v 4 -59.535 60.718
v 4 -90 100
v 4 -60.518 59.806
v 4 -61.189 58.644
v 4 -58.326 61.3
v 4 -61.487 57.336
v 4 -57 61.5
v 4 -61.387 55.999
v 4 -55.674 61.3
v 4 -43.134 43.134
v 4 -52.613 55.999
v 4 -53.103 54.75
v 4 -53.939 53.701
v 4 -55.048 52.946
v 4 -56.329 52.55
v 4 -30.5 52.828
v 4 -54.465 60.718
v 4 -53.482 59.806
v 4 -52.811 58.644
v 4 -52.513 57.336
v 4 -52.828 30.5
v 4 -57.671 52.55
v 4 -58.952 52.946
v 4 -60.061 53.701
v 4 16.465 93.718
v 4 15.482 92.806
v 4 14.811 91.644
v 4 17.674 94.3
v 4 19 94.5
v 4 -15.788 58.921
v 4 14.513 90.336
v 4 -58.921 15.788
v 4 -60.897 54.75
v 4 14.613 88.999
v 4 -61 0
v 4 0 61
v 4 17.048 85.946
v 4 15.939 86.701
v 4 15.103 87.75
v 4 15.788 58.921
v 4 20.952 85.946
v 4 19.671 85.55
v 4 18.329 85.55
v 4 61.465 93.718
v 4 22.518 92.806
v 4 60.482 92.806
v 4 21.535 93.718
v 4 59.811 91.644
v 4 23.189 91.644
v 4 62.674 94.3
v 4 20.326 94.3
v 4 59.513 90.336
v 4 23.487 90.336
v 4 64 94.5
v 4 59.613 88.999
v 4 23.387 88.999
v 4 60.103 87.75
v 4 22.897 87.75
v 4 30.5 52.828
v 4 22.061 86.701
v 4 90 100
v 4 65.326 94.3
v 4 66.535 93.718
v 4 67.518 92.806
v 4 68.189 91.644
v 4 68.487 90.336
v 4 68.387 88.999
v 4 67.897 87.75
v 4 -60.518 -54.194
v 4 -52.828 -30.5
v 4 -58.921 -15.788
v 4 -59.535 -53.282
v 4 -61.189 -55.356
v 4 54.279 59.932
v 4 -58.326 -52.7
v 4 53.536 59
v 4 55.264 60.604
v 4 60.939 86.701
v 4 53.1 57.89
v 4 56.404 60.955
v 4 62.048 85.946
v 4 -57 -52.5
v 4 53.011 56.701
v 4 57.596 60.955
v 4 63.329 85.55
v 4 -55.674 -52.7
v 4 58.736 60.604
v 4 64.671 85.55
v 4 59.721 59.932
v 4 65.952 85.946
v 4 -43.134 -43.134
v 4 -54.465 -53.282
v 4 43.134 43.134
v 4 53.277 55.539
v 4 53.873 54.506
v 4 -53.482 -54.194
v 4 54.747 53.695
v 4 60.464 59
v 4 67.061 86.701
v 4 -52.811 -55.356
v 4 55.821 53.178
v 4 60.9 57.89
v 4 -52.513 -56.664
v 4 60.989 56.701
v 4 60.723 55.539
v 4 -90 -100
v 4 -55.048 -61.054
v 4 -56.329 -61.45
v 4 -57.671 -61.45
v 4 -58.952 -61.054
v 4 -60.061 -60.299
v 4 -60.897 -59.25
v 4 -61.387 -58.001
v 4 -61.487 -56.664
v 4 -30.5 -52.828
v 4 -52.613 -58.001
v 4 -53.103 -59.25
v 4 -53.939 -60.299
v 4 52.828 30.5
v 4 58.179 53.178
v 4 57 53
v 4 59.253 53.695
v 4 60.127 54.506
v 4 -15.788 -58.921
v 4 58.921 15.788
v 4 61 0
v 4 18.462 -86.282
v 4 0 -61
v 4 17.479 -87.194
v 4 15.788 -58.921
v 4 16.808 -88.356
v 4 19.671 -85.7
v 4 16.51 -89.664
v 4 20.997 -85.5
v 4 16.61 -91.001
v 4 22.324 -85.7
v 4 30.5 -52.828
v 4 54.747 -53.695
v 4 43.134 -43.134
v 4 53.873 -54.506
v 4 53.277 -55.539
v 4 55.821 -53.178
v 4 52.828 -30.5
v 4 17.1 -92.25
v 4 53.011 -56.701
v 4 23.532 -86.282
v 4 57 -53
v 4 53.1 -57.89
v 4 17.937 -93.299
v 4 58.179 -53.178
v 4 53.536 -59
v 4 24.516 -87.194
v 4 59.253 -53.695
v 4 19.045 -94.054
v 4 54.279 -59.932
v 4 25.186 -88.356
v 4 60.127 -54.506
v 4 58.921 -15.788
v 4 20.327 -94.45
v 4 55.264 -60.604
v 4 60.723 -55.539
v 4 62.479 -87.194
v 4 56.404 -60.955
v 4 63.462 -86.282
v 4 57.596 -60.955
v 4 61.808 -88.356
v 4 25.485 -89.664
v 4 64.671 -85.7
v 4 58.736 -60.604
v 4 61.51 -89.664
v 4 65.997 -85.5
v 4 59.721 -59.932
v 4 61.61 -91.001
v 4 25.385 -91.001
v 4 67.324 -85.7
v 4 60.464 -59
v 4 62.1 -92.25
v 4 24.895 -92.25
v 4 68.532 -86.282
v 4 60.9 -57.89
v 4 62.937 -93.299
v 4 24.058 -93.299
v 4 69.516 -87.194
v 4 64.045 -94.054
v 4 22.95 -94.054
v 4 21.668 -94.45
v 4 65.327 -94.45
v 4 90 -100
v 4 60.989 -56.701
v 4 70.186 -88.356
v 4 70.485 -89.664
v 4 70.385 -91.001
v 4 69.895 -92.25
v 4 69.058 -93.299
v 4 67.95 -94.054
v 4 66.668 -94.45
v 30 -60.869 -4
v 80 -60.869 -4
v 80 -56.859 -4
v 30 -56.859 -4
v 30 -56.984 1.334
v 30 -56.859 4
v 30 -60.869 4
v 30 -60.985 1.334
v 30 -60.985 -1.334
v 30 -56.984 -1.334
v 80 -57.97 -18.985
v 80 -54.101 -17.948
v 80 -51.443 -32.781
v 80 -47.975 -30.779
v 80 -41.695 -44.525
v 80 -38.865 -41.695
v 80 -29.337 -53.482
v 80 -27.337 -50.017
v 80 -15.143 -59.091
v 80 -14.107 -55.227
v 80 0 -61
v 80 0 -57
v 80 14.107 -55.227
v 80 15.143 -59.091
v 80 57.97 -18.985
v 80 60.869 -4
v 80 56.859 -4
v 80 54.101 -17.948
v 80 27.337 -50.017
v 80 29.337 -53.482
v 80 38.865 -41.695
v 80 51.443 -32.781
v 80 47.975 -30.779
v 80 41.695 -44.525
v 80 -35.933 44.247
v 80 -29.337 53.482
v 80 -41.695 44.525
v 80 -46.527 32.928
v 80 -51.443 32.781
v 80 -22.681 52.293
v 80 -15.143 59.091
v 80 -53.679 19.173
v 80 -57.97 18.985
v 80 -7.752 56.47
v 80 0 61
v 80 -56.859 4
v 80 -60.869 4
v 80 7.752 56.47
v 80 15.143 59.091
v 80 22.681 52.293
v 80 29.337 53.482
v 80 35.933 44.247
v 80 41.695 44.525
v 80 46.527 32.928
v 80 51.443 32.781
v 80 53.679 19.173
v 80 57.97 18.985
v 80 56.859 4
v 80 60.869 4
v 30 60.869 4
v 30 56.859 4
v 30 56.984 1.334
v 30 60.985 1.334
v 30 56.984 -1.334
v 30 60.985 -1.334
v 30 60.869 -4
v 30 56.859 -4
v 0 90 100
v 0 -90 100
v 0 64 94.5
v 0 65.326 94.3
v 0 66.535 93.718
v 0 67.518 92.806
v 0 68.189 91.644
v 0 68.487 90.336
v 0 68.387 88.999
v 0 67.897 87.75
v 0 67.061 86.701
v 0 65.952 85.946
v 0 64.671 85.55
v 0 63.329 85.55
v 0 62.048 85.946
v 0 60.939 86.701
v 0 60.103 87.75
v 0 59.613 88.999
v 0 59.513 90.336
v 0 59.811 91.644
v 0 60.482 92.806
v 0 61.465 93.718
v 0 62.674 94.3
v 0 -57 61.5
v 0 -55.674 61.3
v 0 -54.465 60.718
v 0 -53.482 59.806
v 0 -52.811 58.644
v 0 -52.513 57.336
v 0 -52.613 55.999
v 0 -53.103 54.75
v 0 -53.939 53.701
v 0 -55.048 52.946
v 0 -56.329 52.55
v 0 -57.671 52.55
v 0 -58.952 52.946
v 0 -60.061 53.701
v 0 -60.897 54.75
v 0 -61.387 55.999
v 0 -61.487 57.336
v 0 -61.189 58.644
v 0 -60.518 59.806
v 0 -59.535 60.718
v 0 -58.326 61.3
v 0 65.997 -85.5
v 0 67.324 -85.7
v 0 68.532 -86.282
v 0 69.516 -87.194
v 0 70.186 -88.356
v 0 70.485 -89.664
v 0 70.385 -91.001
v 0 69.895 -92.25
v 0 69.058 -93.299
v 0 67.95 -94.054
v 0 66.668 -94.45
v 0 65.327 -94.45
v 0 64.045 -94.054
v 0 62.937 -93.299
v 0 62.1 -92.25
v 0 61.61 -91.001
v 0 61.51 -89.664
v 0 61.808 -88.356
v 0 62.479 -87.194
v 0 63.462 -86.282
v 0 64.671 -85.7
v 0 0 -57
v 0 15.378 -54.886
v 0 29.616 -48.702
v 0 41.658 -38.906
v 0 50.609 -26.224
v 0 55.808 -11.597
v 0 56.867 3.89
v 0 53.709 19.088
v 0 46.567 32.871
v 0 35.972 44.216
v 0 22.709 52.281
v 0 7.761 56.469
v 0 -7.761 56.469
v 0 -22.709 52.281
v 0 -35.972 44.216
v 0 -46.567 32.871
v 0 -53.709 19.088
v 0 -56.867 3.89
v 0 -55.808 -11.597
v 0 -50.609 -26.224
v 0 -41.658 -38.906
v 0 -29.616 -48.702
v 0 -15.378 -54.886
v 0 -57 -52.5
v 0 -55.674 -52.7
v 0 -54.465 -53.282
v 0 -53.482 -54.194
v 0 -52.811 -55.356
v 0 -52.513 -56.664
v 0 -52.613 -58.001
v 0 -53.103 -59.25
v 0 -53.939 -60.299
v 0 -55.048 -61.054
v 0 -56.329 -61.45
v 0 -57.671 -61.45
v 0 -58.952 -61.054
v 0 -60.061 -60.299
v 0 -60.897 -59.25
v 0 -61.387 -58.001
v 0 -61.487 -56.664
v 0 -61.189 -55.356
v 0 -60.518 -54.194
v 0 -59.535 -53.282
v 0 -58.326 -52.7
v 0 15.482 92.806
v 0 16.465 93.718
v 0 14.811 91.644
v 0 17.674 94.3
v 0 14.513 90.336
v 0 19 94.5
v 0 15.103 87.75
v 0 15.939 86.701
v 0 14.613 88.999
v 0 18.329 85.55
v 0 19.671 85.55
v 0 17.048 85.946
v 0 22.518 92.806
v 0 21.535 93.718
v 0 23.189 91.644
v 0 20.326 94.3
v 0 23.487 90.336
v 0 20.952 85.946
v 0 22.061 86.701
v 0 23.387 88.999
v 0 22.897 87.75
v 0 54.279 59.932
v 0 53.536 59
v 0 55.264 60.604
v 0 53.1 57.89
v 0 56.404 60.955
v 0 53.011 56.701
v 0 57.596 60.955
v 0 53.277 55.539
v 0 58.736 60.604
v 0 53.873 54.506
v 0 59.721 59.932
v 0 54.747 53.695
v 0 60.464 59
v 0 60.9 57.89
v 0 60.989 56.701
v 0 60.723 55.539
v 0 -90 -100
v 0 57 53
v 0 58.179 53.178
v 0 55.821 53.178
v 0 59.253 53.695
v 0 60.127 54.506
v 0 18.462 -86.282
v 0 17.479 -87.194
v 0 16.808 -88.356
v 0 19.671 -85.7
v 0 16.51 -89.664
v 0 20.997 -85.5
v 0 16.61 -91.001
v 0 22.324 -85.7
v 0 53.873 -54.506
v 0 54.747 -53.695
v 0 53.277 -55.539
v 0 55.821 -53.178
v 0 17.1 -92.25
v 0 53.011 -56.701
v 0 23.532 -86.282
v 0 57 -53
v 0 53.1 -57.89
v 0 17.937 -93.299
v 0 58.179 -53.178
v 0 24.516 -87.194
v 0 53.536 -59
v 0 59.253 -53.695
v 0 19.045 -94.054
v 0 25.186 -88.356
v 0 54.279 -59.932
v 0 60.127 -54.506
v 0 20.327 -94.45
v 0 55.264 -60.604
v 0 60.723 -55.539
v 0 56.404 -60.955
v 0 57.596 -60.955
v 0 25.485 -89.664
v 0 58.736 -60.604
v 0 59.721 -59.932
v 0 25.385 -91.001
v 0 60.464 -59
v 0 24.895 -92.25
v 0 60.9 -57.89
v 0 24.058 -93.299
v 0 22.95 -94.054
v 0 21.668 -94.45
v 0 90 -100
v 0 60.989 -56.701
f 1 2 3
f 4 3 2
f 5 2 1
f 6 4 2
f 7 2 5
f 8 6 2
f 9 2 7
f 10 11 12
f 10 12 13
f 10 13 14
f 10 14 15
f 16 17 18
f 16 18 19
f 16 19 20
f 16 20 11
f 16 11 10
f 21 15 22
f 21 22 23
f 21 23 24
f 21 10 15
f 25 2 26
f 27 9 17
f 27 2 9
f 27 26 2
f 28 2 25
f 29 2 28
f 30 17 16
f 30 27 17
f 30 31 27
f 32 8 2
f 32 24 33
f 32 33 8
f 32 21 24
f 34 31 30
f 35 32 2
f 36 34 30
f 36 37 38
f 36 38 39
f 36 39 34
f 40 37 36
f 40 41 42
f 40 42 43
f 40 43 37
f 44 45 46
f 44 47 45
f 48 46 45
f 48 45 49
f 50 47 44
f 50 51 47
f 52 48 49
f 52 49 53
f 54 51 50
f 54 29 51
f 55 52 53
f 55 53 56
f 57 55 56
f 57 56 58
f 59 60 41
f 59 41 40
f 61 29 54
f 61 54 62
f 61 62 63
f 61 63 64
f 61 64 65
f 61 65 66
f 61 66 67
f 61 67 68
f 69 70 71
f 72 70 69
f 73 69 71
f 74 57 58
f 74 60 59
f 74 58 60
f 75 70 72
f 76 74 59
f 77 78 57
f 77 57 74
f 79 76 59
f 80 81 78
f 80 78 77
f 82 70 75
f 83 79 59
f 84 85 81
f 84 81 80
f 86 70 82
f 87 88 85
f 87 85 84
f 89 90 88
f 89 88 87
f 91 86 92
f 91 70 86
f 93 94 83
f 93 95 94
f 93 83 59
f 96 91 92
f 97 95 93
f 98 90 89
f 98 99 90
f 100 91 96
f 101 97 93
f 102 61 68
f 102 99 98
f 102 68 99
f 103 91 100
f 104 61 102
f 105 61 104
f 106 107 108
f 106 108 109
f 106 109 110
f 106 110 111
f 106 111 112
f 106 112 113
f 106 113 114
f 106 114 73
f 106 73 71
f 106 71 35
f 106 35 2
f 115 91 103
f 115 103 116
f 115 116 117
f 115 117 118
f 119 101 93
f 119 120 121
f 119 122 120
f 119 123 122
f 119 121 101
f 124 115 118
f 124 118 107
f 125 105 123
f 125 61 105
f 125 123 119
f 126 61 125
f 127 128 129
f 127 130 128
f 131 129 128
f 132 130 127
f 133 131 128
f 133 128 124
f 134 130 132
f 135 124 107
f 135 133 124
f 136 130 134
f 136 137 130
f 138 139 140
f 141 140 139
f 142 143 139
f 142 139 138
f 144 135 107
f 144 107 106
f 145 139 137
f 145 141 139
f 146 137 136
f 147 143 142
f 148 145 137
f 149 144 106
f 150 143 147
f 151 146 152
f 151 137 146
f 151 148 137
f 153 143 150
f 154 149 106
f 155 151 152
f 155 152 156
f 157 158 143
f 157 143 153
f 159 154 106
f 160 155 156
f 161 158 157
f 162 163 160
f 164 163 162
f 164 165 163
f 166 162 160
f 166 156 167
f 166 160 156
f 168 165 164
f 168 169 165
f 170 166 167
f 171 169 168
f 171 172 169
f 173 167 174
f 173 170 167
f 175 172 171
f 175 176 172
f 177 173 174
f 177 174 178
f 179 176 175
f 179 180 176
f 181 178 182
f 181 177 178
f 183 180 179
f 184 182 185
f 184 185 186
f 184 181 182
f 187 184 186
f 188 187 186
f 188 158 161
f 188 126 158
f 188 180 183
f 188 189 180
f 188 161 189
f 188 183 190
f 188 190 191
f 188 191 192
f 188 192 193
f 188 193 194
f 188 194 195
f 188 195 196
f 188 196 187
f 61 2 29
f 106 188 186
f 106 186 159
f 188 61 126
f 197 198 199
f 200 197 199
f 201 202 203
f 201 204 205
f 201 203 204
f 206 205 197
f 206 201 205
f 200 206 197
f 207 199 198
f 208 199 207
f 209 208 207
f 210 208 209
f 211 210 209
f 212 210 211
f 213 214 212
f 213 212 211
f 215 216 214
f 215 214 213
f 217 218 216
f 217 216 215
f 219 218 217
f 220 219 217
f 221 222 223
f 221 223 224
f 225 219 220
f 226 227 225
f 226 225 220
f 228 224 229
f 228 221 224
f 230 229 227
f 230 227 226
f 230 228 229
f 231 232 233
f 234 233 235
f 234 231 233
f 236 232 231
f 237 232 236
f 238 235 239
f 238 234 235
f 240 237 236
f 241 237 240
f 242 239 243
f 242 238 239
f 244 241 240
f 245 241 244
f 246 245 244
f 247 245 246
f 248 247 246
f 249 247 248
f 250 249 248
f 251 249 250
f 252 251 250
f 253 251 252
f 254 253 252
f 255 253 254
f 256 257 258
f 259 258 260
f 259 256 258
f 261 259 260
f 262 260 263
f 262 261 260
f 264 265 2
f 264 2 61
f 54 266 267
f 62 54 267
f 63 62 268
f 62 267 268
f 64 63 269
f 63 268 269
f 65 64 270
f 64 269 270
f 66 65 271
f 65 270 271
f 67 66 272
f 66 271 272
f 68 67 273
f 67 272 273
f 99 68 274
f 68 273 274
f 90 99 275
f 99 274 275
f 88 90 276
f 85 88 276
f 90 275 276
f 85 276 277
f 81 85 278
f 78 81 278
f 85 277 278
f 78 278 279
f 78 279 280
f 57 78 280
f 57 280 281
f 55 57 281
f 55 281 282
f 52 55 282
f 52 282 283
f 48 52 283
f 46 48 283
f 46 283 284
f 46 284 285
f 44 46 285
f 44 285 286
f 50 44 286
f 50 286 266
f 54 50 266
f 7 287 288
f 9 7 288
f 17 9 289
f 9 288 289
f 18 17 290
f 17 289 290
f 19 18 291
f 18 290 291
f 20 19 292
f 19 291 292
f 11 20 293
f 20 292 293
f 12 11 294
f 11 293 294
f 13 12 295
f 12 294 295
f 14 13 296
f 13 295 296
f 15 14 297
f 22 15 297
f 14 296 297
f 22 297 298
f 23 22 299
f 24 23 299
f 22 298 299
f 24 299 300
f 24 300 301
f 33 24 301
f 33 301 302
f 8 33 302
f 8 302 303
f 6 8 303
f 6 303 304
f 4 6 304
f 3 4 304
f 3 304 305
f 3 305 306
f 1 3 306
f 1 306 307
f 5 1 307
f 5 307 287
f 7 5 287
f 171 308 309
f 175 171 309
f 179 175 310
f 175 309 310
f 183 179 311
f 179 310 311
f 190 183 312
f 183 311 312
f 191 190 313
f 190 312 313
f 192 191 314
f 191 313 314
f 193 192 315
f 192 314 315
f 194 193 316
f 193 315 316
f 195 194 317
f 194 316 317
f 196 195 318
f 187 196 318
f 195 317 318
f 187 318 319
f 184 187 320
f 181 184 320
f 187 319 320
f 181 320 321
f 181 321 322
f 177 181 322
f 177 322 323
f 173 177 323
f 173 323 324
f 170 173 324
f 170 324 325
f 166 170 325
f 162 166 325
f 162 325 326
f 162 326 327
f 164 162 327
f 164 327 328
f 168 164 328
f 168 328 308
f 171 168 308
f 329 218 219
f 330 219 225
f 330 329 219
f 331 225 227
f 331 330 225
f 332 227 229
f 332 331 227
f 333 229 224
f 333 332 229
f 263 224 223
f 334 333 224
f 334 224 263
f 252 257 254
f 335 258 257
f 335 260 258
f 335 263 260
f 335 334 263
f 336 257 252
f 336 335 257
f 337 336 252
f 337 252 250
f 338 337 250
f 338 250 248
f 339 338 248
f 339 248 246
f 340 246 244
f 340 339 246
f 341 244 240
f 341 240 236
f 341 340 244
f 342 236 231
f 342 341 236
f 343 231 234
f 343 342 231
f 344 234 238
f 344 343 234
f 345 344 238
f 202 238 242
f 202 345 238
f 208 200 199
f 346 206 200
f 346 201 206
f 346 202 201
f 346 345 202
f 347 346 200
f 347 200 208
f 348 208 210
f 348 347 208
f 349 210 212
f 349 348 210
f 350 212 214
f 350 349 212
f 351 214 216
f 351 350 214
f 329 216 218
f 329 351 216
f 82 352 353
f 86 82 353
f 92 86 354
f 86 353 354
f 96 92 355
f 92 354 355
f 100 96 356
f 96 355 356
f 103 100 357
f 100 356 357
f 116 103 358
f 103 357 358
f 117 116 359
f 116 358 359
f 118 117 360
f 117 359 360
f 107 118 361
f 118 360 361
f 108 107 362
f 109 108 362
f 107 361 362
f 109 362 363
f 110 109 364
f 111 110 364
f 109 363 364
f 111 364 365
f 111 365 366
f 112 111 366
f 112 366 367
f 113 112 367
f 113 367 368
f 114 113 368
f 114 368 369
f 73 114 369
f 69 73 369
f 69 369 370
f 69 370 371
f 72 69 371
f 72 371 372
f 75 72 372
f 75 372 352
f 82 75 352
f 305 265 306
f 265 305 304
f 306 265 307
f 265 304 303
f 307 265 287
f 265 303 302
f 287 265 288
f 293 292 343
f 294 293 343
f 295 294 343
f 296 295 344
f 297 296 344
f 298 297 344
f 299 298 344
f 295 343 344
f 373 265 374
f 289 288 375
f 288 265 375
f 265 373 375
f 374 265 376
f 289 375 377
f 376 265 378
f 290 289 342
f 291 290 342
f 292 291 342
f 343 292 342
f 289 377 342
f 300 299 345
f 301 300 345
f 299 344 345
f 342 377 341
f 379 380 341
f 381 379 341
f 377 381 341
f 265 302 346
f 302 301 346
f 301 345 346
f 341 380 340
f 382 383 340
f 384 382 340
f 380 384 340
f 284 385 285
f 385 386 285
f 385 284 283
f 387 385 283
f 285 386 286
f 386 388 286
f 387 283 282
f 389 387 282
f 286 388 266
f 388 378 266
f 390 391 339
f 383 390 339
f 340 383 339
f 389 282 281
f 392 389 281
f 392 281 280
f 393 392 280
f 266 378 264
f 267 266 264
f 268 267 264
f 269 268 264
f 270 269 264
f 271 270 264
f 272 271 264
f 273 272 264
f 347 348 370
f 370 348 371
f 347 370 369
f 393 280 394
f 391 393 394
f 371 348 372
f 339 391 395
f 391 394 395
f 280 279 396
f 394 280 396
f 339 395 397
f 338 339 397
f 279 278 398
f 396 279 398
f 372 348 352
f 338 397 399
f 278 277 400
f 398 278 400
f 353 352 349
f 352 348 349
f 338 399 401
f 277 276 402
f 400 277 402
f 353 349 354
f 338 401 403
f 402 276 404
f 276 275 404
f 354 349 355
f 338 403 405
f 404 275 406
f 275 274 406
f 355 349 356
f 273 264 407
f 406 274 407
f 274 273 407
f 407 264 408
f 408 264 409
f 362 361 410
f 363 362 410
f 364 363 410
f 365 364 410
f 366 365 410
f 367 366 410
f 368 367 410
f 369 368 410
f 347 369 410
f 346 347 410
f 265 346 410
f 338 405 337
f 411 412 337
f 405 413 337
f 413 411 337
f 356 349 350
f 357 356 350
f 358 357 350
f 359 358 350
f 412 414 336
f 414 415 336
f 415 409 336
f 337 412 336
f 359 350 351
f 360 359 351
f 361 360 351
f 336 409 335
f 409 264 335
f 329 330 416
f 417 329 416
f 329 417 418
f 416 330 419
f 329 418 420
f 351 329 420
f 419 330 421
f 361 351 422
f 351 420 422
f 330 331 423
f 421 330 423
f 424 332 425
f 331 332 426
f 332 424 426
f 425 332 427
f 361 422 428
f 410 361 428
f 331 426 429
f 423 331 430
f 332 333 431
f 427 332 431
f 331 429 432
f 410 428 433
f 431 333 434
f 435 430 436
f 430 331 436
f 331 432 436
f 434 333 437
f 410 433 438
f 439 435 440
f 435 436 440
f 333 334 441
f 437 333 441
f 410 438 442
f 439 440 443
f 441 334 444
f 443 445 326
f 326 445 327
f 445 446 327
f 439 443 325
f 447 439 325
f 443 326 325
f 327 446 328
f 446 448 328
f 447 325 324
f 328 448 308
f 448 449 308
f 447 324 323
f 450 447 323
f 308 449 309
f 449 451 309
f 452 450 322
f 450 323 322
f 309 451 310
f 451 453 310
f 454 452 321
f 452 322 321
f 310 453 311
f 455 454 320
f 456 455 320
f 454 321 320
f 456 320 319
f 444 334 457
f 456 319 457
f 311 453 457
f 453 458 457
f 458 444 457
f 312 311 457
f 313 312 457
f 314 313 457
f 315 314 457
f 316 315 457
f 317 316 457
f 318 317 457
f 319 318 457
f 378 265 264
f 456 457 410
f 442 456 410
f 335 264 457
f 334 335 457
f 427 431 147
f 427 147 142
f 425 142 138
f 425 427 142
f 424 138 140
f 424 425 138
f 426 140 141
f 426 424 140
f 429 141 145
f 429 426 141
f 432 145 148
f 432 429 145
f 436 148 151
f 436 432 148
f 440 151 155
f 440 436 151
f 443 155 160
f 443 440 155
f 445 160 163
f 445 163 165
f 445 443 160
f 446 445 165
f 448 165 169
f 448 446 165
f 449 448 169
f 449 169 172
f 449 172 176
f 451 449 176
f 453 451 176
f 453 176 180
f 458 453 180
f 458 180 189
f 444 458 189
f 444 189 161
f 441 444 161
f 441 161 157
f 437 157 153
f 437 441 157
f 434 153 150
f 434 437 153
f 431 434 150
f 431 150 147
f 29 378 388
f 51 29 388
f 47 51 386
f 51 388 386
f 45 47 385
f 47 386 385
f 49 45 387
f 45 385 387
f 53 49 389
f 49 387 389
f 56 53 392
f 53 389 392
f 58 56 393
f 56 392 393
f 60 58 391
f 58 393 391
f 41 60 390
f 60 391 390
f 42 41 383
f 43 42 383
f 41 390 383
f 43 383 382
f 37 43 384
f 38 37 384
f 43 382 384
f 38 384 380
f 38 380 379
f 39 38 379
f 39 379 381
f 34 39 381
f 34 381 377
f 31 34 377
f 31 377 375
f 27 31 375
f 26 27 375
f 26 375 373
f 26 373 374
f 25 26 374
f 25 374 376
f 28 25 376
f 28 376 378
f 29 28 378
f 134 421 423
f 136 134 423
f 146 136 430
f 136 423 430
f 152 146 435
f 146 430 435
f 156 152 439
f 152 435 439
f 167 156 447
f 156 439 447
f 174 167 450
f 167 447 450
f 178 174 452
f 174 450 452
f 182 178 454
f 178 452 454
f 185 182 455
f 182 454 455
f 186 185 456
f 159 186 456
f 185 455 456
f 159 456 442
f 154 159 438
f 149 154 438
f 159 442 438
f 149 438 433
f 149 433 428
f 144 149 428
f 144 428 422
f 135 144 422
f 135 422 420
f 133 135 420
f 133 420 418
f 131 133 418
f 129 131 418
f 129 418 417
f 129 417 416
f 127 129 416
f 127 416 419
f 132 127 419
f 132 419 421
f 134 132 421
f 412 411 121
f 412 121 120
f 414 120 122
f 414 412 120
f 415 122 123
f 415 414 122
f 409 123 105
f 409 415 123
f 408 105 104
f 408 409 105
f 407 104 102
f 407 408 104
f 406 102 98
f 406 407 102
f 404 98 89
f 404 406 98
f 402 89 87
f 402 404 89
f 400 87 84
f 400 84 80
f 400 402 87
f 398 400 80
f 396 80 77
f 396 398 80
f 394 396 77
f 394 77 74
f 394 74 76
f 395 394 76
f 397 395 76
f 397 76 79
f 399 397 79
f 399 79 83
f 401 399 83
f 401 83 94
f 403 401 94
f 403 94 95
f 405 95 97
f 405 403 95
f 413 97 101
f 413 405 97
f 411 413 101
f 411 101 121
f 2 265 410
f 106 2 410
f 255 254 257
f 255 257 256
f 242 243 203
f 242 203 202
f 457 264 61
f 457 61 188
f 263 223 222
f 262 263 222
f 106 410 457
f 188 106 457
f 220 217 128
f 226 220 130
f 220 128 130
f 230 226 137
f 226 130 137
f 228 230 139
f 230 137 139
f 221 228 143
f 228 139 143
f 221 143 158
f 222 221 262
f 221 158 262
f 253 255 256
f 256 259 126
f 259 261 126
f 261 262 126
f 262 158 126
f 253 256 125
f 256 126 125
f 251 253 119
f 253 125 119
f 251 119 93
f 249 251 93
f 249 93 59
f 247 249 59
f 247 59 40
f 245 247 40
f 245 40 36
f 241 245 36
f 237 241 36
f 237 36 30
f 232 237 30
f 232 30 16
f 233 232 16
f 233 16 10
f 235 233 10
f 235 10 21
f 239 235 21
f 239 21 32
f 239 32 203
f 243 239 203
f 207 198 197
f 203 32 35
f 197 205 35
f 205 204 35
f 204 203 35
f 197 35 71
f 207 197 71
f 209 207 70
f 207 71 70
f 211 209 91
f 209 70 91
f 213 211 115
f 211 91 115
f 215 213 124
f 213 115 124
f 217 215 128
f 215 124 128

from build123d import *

# Parameters (mm, degrees)
CROQUIS1_W                       = 200
CROQUIS1_H                       = 180
CROQUIS1_R                       = 57
CROQUIS1_R_2                     = 4
SALIENTE_EXTRUIR1_DEPTH          = 4
CROQUIS2_R                       = 61
CROQUIS2_R_2                     = 57
SALIENTE_EXTRUIR2_DEPTH          = 76
CROQUIS3_W                       = 8
CROQUIS3_H                       = 23.163617774
CORTAR_EXTRUIR1_DEPTH            = 50
TALADRO_DE_MARGEN_PARA_M81_D     = 9
TALADRO_DE_MARGEN_PARA_M81_DEPTH = 4.999


with BuildPart() as part:
    # Croquis1 → Saliente-Extruir1 (new body)
    with BuildSketch(Plane(origin=(0, 0, 0), x_dir=(0, 0, -1), z_dir=(1, 0, 0))):
        Rectangle(CROQUIS1_W, CROQUIS1_H)
        Circle(CROQUIS1_R, mode=Mode.SUBTRACT)
        with Locations((-57, 57)):
            Circle(CROQUIS1_R_2, mode=Mode.SUBTRACT)
        with Locations(Location((57, 57, 0), (0, 0, 180))):
            Circle(CROQUIS1_R_2, mode=Mode.SUBTRACT)
        with Locations((57, -57)):
            Circle(CROQUIS1_R_2, mode=Mode.SUBTRACT)
        with Locations(Location((-57, -57, 0), (0, 0, 180))):
            Circle(CROQUIS1_R_2, mode=Mode.SUBTRACT)
    extrude(amount=SALIENTE_EXTRUIR1_DEPTH)

    # Croquis2 → Saliente-Extruir2 (add)
    with BuildSketch(Plane(origin=(4, 0, 0), x_dir=(0, 0, -1), z_dir=(1, 0, 0))):
        Circle(CROQUIS2_R)
        Circle(CROQUIS2_R_2, mode=Mode.SUBTRACT)
    extrude(amount=SALIENTE_EXTRUIR2_DEPTH)

    # Croquis3 → Cortar-Extruir1 (cut)
    with BuildSketch(Plane(origin=(80, 0, 0), x_dir=(0, 0, -1), z_dir=(1, 0, 0))):
        with Locations((0, 57)):
            Rectangle(CROQUIS3_W, CROQUIS3_H)
        with Locations((0, -57)):
            Rectangle(CROQUIS3_W, CROQUIS3_H)
    extrude(amount=-CORTAR_EXTRUIR1_DEPTH, mode=Mode.SUBTRACT)

    # Taladro de margen para M81
    with Locations(Plane(origin=(4, -7.41730184, -252.760845032), x_dir=(0, 0, -1), z_dir=(1, 0, 0))):
        with Locations((-342.760845032, 71.41730184), (-342.760845032, 26.41730184), (-162.760845032, 73.414694032), (-162.760845032, 28.414694032), (-195.760845032, -49.58269816), (-309.760845032, -49.58269816)):
            Hole(TALADRO_DE_MARGEN_PARA_M81_D / 2, depth=TALADRO_DE_MARGEN_PARA_M81_DEPTH)


solid = part.part
